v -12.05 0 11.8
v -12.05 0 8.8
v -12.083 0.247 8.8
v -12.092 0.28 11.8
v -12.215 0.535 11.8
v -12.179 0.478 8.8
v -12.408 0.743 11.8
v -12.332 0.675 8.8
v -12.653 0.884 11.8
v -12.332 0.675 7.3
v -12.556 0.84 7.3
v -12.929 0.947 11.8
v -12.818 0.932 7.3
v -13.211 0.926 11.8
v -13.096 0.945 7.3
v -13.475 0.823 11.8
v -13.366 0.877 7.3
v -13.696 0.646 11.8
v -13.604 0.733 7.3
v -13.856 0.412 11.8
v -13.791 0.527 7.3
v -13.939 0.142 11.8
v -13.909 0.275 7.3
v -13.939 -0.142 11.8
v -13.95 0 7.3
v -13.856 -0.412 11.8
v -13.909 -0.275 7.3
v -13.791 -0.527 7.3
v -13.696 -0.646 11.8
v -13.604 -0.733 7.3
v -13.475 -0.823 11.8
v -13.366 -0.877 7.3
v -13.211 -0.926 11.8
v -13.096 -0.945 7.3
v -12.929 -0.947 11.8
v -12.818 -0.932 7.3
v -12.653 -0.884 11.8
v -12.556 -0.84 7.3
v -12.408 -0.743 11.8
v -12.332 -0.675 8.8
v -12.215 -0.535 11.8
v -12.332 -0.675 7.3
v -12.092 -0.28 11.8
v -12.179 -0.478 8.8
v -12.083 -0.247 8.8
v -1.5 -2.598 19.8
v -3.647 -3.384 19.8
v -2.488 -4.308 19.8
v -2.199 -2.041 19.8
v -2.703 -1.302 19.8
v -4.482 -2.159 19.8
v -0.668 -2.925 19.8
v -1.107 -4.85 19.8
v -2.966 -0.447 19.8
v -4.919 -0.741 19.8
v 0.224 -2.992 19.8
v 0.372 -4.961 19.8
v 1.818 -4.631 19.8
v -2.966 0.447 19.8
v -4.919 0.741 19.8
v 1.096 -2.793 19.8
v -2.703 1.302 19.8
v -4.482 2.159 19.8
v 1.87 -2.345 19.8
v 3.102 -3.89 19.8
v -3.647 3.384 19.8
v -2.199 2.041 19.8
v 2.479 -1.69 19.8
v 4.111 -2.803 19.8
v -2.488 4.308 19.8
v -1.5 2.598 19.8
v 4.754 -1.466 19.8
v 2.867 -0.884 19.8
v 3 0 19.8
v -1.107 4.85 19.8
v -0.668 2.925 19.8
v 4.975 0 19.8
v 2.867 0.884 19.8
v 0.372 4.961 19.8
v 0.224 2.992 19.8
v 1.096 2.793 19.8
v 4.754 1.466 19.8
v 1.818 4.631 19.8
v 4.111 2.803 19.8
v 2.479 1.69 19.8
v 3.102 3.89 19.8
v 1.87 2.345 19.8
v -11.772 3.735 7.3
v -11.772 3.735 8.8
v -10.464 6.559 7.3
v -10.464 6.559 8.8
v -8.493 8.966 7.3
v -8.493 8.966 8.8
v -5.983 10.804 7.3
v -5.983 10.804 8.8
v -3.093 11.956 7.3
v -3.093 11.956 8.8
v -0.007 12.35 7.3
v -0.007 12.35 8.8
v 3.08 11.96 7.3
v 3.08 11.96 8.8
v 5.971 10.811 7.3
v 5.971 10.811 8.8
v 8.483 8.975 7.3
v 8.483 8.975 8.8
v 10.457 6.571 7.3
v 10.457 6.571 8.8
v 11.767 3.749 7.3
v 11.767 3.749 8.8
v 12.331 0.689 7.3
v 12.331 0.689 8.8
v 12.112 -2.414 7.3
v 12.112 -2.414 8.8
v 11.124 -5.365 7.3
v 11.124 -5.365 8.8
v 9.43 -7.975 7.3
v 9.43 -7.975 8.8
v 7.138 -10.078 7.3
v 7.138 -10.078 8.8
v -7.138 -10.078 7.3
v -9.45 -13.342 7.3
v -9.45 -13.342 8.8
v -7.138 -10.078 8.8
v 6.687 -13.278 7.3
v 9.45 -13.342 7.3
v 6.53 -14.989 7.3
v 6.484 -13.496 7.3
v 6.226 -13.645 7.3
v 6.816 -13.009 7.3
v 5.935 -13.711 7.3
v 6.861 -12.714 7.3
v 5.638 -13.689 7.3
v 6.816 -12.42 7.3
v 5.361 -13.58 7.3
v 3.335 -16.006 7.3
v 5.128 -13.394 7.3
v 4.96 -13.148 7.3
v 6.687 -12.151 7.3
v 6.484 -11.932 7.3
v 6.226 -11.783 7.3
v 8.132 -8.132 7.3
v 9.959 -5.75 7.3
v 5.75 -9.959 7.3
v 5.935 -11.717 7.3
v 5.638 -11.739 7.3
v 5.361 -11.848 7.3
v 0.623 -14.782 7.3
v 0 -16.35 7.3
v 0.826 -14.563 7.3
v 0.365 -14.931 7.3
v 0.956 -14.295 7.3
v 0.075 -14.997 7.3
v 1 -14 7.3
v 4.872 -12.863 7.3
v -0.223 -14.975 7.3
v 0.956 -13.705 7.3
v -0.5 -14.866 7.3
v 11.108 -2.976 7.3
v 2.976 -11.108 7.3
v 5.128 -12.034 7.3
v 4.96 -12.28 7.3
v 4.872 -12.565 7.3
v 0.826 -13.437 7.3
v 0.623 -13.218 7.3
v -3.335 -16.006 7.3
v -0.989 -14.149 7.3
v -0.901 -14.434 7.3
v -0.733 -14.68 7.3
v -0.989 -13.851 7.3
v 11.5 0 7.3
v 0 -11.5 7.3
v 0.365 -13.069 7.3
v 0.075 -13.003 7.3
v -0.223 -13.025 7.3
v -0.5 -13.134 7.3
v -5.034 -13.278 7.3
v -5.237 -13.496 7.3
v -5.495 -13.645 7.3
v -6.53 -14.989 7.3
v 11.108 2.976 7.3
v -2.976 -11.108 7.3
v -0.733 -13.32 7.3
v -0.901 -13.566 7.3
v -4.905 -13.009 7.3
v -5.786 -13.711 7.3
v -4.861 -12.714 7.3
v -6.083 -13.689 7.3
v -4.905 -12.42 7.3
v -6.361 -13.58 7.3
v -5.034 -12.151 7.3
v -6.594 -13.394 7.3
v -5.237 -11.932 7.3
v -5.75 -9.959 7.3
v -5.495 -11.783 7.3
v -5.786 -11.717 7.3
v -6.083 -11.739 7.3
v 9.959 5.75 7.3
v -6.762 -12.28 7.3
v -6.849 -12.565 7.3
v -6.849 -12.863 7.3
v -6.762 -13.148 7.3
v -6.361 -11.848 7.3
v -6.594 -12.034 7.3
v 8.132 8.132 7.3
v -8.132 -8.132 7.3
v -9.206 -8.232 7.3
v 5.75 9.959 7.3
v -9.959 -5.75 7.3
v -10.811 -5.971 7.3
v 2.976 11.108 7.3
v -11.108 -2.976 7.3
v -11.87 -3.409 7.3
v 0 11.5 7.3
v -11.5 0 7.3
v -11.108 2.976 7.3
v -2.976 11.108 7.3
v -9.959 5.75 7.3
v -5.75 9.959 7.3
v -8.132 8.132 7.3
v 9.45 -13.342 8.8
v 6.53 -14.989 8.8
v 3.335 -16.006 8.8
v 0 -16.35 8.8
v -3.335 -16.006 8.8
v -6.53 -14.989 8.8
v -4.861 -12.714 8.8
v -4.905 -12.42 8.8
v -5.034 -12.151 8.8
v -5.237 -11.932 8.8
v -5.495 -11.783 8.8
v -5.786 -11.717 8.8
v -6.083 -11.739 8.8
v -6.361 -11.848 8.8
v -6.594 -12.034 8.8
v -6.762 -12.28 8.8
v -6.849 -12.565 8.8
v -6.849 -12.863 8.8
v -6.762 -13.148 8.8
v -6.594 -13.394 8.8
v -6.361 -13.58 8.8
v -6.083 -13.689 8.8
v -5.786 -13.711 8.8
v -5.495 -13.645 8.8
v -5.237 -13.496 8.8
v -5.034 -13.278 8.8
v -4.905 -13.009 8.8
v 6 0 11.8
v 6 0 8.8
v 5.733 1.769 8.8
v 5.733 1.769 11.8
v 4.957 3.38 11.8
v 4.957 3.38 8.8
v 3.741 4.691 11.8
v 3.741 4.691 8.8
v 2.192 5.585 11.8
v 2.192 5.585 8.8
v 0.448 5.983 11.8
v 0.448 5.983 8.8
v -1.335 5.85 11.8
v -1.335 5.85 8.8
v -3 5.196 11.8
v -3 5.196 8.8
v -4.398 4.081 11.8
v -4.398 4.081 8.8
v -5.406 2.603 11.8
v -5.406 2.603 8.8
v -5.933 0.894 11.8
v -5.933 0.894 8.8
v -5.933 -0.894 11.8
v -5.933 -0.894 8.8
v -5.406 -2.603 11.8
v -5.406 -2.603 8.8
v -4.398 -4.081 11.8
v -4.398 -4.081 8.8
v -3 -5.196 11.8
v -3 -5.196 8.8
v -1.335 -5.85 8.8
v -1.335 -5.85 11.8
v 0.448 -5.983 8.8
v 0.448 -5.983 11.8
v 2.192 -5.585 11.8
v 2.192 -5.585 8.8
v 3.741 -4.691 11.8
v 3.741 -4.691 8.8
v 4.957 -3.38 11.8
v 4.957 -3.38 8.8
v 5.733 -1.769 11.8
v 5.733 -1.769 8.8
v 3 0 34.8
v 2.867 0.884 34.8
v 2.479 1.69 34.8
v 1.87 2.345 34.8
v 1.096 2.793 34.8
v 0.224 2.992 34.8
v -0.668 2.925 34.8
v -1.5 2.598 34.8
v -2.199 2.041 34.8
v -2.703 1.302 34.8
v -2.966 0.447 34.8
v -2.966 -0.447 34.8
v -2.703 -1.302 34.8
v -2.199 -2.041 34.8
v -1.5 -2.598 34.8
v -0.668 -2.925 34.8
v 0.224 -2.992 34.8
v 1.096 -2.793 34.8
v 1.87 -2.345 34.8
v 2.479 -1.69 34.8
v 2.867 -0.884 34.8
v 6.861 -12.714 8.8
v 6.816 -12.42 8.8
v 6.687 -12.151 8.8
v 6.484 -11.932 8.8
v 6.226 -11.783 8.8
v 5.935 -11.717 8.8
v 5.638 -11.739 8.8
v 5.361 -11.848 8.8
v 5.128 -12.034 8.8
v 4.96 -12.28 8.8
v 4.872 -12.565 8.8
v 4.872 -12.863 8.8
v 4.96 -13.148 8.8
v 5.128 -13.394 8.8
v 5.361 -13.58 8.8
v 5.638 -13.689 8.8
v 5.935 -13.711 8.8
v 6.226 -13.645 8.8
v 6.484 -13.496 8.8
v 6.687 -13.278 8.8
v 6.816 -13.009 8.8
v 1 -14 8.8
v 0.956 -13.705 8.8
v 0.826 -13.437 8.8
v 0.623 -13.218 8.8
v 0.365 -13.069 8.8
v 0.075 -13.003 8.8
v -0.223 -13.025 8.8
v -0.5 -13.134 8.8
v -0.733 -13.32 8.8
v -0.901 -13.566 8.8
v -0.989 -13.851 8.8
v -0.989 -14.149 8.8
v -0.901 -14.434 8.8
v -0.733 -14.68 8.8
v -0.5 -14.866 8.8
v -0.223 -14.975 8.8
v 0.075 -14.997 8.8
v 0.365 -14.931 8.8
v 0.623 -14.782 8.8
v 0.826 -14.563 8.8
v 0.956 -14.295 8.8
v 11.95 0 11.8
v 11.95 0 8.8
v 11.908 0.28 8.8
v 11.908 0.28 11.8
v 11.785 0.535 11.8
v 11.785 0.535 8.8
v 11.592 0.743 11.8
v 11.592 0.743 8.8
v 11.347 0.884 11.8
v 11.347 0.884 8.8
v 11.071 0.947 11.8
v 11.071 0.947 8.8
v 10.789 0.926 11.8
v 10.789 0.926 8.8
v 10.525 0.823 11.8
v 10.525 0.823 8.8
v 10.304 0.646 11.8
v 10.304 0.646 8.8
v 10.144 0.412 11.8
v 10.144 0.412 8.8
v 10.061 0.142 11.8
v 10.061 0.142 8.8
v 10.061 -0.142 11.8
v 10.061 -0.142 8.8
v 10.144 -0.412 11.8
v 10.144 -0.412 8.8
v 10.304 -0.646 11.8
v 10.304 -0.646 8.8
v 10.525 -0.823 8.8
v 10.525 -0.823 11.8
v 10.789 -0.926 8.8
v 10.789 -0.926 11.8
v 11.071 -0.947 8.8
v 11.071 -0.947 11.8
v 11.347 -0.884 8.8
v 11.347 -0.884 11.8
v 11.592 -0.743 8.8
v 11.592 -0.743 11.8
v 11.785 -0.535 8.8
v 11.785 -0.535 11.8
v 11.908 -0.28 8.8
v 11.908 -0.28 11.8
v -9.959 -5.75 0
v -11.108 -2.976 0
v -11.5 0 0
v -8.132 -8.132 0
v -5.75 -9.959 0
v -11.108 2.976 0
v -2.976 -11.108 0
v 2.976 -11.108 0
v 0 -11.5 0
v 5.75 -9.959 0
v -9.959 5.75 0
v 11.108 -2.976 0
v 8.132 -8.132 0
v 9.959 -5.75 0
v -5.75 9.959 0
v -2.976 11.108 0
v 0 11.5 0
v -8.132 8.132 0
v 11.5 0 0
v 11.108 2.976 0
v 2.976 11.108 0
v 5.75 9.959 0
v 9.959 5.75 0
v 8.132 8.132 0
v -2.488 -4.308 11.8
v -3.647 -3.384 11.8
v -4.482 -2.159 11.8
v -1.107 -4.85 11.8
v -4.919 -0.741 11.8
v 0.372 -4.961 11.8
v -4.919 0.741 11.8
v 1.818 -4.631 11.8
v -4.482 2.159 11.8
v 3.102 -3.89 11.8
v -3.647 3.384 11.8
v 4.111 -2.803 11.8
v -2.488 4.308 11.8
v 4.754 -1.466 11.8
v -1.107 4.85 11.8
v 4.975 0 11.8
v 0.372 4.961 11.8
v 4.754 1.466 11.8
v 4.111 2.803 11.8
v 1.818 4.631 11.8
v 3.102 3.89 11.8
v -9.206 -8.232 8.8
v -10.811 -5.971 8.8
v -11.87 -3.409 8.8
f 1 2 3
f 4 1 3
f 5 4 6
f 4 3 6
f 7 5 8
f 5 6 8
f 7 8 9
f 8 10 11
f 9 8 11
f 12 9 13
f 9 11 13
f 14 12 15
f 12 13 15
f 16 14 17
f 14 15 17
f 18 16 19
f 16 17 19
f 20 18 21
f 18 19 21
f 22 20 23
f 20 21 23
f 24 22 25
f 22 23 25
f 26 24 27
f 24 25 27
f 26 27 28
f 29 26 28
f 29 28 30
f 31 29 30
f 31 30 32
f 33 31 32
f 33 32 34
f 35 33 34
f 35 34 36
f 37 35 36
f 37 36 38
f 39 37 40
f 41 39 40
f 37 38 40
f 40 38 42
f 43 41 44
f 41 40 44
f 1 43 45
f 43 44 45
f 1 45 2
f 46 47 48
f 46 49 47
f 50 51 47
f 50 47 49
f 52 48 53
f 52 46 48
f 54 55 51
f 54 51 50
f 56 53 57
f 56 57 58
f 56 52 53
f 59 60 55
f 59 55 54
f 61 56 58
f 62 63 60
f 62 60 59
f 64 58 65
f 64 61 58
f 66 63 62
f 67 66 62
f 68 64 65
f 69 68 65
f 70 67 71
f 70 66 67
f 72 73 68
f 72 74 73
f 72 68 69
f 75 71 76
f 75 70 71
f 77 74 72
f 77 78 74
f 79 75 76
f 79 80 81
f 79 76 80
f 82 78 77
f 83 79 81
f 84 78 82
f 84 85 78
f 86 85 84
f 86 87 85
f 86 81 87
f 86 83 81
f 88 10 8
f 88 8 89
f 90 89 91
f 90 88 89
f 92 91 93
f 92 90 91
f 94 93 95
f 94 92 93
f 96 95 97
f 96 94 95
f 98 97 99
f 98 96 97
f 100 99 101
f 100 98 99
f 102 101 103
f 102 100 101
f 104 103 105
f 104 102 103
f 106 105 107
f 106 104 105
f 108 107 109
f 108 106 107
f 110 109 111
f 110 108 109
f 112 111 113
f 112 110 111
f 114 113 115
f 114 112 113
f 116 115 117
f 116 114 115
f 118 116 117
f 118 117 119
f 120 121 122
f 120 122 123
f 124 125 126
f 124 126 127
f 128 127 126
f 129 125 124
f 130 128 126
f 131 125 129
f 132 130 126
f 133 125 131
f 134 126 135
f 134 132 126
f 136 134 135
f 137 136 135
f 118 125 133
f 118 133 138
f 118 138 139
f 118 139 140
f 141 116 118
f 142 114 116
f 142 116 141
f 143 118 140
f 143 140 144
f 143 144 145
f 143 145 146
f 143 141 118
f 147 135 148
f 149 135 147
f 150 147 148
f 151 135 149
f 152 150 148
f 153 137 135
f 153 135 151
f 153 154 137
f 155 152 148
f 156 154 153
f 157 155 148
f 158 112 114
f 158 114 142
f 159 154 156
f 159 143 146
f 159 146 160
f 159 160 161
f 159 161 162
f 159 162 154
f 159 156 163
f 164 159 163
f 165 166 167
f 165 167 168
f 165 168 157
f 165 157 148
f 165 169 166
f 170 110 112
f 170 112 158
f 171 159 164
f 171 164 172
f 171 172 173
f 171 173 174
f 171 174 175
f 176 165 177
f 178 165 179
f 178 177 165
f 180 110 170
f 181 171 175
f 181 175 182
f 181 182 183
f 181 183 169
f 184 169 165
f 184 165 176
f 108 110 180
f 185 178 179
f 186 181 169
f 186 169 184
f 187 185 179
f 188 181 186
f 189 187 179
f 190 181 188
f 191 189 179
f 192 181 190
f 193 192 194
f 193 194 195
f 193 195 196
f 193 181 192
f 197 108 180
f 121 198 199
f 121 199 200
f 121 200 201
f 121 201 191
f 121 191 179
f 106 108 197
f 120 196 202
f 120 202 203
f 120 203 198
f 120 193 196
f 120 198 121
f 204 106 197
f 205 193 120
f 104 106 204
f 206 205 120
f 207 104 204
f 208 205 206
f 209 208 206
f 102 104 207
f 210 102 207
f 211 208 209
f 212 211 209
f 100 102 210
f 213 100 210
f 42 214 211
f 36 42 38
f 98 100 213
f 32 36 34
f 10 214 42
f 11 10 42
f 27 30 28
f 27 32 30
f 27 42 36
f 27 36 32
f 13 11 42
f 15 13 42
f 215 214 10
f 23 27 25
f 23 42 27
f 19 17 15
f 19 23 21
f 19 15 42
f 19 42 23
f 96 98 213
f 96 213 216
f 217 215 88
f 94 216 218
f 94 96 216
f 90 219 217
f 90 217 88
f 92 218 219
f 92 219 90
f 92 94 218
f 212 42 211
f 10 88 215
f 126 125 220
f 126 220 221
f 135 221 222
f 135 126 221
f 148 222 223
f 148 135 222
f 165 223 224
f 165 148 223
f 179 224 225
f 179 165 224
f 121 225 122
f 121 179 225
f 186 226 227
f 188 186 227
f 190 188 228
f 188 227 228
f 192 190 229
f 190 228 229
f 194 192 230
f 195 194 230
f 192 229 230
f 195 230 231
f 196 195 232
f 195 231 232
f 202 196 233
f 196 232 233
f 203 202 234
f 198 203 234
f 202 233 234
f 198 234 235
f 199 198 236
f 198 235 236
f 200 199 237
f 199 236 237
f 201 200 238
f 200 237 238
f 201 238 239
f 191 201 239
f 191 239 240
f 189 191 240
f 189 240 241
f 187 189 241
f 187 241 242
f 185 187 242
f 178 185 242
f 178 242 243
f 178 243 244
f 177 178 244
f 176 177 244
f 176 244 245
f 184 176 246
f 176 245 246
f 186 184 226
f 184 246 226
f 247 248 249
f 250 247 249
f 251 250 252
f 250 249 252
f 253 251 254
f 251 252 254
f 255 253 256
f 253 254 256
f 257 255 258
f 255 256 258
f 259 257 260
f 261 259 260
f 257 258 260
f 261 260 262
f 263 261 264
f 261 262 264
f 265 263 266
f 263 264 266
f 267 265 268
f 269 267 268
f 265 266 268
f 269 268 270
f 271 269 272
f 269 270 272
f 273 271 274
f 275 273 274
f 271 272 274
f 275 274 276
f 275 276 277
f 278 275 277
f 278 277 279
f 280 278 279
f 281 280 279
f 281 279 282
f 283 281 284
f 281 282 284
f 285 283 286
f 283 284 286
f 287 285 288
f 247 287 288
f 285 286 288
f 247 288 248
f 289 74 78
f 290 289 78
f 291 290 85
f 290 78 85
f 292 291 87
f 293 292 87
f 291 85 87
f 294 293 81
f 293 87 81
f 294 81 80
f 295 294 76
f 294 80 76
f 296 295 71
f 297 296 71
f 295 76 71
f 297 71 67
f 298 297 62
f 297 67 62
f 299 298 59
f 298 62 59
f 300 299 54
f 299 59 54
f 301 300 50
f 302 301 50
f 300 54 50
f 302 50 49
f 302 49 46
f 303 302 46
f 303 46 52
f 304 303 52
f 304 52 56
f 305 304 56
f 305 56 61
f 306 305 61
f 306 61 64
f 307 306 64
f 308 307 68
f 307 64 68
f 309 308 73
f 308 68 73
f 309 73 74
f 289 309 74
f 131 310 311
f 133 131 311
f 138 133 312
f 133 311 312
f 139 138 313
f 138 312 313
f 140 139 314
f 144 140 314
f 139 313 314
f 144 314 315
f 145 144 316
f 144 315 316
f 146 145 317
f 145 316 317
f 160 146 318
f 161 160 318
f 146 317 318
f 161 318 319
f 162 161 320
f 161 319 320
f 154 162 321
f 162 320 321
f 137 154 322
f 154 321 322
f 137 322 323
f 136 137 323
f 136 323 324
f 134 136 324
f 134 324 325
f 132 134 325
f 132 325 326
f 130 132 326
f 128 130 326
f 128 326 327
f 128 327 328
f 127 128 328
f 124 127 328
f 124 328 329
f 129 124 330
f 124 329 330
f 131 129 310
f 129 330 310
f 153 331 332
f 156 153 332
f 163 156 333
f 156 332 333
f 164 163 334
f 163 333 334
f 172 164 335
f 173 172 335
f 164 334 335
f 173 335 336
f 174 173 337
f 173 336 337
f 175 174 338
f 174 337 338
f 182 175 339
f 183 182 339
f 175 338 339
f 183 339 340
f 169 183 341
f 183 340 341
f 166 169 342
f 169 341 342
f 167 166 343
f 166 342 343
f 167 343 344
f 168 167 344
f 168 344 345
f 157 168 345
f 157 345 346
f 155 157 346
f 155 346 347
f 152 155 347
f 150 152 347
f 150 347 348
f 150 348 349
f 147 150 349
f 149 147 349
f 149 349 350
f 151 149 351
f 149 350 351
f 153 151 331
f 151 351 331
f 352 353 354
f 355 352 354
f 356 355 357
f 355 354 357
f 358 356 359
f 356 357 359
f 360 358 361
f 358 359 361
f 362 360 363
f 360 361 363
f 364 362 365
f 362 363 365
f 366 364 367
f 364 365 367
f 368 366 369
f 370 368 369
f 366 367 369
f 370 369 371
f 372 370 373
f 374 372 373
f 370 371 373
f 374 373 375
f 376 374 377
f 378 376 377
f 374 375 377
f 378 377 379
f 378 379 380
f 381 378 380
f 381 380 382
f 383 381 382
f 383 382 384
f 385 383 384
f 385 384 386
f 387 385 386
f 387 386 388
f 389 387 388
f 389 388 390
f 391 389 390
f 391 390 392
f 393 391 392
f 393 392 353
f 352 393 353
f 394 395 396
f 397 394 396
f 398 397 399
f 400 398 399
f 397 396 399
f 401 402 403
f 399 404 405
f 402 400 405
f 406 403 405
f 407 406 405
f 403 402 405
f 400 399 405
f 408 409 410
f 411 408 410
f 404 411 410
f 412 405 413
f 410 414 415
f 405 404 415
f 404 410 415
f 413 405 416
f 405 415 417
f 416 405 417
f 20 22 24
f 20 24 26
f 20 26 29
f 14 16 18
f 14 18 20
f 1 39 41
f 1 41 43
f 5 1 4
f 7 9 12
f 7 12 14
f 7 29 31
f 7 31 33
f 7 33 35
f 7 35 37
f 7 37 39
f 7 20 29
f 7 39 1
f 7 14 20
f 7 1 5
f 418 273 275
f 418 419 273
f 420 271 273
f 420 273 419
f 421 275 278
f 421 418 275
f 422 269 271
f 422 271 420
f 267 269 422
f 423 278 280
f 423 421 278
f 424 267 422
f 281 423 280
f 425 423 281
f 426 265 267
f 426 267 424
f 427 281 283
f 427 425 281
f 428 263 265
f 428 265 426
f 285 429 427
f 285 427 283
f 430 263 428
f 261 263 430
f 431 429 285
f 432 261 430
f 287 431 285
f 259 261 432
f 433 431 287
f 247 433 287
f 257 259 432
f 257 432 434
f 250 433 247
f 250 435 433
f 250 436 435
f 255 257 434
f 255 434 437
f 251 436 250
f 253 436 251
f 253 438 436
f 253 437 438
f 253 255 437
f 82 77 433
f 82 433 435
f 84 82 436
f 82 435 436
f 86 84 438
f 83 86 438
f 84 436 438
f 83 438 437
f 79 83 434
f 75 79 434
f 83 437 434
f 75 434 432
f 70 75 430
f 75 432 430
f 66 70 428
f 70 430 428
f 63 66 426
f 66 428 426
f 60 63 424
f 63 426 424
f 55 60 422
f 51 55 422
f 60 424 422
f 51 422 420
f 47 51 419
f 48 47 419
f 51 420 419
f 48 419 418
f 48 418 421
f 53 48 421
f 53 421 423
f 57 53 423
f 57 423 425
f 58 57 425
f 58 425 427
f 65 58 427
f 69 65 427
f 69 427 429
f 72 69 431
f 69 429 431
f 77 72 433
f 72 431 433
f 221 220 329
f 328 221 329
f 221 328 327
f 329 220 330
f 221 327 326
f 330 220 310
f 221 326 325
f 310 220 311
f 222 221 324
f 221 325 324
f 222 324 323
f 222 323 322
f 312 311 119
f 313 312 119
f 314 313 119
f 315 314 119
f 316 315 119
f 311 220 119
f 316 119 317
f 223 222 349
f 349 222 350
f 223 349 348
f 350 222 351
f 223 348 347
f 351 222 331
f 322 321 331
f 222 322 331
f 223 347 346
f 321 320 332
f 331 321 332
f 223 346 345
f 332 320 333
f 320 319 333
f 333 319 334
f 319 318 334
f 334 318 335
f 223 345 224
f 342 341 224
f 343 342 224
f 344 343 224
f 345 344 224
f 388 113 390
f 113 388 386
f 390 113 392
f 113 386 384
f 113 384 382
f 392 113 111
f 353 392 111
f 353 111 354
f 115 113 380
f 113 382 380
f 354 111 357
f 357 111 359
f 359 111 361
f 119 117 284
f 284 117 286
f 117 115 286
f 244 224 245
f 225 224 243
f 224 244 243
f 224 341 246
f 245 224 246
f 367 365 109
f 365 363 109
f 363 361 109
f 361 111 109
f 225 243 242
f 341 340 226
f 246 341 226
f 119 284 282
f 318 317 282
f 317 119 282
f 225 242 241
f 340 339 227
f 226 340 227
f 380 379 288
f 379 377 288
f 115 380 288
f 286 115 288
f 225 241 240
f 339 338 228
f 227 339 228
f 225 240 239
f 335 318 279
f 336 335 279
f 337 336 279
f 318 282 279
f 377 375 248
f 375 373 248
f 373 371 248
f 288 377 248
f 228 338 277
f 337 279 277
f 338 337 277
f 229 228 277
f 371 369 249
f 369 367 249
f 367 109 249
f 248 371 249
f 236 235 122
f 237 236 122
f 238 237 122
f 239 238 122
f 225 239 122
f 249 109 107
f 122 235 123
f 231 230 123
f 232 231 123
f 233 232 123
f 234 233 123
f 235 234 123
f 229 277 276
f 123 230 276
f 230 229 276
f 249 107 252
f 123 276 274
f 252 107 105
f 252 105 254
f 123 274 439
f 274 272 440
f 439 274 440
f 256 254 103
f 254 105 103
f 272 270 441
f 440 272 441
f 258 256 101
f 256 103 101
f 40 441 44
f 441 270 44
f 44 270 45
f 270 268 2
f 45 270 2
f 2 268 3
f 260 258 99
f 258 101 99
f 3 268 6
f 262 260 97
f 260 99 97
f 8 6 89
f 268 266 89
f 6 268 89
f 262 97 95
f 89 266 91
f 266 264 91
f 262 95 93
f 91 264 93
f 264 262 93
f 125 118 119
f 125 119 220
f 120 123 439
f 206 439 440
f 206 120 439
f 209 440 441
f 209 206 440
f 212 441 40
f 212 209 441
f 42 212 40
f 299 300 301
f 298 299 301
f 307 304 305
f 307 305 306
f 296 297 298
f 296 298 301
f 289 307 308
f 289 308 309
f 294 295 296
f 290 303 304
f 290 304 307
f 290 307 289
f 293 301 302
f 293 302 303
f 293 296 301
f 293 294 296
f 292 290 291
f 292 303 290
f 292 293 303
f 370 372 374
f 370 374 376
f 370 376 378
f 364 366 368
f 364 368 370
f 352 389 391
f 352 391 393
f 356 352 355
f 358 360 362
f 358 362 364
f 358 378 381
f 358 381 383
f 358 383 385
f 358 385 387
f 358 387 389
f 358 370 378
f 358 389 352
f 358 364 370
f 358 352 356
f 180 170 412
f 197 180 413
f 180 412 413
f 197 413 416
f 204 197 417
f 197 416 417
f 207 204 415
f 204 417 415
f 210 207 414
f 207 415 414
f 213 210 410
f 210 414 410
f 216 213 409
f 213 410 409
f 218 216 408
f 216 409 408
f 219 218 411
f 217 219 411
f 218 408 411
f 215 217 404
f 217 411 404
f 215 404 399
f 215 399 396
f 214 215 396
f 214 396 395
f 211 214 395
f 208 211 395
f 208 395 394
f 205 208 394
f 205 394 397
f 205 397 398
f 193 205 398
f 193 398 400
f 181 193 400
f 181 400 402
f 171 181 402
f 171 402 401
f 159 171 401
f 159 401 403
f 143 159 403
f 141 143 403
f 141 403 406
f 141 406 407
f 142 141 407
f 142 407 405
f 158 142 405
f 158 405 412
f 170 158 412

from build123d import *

# Parameters (mm, degrees)
SKETCH1_R      = 11.5
EXTRUDE1_DEPTH = 7.3
EXTRUDE2_DEPTH = 1.5
SKETCH3_R      = 1
EXTRUDE3_DEPTH = 1.5
SKETCH4_R      = 6
EXTRUDE4_DEPTH = 3
SKETCH5_R      = 4.975
EXTRUDE5_DEPTH = 8
SKETCH6_R      = 3
EXTRUDE6_DEPTH = 15
EXTRUDE7_START = -1.5
SKETCH7_R      = 0.95
EXTRUDE7_DEPTH = 4.5


with BuildPart() as part:
    # Sketch1 → Extrude1 (new body)
    with BuildSketch(Plane.XY):
        Circle(SKETCH1_R)
    extrude(amount=EXTRUDE1_DEPTH)

    # Sketch2 → Extrude2 (add)
    with BuildSketch(Plane.XY.offset(7.3)):
        with BuildLine():
            Line((-9.45, -13.342413575), (-7.138073394, -10.078214535))
            ThreePointArc((-7.138073394, -10.078214535), (0, 12.35), (7.138073394, -10.078214535))
            Line((7.138073394, -10.078214535), (9.45, -13.342413575))
            ThreePointArc((9.45, -13.342413575), (0, -16.35), (-9.45, -13.342413575))
        make_face()
    extrude(amount=EXTRUDE2_DEPTH)

    # Sketch3 → Extrude3 (cut)
    with BuildSketch(Plane.XY.offset(8.8)):
        with Locations((0, -14)):
            Circle(SKETCH3_R)
        with Locations((5.860626142, -12.714285714)):
            Circle(SKETCH3_R)
        with Locations((-5.860626142, -12.714285714)):
            Circle(SKETCH3_R)
    extrude(amount=-EXTRUDE3_DEPTH, mode=Mode.SUBTRACT)

    # Sketch4 → Extrude4 (add)
    with BuildSketch(Plane.XY.offset(8.8)):
        Circle(SKETCH4_R)
    extrude(amount=EXTRUDE4_DEPTH)

    # Sketch5 → Extrude5 (add)
    with BuildSketch(Plane.XY.offset(11.8)):
        Circle(SKETCH5_R)
    extrude(amount=EXTRUDE5_DEPTH)

    # Sketch6 → Extrude6 (add)
    with BuildSketch(Plane.XY.offset(19.8)):
        Circle(SKETCH6_R)
    extrude(amount=EXTRUDE6_DEPTH)

    # Sketch7 → Extrude7 (add)
    with BuildSketch(Plane.XY.offset(8.8).offset(EXTRUDE7_START)):
        with Locations((11, 0)):
            Circle(SKETCH7_R)
        with Locations((-13, 0)):
            Circle(SKETCH7_R)
    extrude(amount=EXTRUDE7_DEPTH)


solid = part.part
